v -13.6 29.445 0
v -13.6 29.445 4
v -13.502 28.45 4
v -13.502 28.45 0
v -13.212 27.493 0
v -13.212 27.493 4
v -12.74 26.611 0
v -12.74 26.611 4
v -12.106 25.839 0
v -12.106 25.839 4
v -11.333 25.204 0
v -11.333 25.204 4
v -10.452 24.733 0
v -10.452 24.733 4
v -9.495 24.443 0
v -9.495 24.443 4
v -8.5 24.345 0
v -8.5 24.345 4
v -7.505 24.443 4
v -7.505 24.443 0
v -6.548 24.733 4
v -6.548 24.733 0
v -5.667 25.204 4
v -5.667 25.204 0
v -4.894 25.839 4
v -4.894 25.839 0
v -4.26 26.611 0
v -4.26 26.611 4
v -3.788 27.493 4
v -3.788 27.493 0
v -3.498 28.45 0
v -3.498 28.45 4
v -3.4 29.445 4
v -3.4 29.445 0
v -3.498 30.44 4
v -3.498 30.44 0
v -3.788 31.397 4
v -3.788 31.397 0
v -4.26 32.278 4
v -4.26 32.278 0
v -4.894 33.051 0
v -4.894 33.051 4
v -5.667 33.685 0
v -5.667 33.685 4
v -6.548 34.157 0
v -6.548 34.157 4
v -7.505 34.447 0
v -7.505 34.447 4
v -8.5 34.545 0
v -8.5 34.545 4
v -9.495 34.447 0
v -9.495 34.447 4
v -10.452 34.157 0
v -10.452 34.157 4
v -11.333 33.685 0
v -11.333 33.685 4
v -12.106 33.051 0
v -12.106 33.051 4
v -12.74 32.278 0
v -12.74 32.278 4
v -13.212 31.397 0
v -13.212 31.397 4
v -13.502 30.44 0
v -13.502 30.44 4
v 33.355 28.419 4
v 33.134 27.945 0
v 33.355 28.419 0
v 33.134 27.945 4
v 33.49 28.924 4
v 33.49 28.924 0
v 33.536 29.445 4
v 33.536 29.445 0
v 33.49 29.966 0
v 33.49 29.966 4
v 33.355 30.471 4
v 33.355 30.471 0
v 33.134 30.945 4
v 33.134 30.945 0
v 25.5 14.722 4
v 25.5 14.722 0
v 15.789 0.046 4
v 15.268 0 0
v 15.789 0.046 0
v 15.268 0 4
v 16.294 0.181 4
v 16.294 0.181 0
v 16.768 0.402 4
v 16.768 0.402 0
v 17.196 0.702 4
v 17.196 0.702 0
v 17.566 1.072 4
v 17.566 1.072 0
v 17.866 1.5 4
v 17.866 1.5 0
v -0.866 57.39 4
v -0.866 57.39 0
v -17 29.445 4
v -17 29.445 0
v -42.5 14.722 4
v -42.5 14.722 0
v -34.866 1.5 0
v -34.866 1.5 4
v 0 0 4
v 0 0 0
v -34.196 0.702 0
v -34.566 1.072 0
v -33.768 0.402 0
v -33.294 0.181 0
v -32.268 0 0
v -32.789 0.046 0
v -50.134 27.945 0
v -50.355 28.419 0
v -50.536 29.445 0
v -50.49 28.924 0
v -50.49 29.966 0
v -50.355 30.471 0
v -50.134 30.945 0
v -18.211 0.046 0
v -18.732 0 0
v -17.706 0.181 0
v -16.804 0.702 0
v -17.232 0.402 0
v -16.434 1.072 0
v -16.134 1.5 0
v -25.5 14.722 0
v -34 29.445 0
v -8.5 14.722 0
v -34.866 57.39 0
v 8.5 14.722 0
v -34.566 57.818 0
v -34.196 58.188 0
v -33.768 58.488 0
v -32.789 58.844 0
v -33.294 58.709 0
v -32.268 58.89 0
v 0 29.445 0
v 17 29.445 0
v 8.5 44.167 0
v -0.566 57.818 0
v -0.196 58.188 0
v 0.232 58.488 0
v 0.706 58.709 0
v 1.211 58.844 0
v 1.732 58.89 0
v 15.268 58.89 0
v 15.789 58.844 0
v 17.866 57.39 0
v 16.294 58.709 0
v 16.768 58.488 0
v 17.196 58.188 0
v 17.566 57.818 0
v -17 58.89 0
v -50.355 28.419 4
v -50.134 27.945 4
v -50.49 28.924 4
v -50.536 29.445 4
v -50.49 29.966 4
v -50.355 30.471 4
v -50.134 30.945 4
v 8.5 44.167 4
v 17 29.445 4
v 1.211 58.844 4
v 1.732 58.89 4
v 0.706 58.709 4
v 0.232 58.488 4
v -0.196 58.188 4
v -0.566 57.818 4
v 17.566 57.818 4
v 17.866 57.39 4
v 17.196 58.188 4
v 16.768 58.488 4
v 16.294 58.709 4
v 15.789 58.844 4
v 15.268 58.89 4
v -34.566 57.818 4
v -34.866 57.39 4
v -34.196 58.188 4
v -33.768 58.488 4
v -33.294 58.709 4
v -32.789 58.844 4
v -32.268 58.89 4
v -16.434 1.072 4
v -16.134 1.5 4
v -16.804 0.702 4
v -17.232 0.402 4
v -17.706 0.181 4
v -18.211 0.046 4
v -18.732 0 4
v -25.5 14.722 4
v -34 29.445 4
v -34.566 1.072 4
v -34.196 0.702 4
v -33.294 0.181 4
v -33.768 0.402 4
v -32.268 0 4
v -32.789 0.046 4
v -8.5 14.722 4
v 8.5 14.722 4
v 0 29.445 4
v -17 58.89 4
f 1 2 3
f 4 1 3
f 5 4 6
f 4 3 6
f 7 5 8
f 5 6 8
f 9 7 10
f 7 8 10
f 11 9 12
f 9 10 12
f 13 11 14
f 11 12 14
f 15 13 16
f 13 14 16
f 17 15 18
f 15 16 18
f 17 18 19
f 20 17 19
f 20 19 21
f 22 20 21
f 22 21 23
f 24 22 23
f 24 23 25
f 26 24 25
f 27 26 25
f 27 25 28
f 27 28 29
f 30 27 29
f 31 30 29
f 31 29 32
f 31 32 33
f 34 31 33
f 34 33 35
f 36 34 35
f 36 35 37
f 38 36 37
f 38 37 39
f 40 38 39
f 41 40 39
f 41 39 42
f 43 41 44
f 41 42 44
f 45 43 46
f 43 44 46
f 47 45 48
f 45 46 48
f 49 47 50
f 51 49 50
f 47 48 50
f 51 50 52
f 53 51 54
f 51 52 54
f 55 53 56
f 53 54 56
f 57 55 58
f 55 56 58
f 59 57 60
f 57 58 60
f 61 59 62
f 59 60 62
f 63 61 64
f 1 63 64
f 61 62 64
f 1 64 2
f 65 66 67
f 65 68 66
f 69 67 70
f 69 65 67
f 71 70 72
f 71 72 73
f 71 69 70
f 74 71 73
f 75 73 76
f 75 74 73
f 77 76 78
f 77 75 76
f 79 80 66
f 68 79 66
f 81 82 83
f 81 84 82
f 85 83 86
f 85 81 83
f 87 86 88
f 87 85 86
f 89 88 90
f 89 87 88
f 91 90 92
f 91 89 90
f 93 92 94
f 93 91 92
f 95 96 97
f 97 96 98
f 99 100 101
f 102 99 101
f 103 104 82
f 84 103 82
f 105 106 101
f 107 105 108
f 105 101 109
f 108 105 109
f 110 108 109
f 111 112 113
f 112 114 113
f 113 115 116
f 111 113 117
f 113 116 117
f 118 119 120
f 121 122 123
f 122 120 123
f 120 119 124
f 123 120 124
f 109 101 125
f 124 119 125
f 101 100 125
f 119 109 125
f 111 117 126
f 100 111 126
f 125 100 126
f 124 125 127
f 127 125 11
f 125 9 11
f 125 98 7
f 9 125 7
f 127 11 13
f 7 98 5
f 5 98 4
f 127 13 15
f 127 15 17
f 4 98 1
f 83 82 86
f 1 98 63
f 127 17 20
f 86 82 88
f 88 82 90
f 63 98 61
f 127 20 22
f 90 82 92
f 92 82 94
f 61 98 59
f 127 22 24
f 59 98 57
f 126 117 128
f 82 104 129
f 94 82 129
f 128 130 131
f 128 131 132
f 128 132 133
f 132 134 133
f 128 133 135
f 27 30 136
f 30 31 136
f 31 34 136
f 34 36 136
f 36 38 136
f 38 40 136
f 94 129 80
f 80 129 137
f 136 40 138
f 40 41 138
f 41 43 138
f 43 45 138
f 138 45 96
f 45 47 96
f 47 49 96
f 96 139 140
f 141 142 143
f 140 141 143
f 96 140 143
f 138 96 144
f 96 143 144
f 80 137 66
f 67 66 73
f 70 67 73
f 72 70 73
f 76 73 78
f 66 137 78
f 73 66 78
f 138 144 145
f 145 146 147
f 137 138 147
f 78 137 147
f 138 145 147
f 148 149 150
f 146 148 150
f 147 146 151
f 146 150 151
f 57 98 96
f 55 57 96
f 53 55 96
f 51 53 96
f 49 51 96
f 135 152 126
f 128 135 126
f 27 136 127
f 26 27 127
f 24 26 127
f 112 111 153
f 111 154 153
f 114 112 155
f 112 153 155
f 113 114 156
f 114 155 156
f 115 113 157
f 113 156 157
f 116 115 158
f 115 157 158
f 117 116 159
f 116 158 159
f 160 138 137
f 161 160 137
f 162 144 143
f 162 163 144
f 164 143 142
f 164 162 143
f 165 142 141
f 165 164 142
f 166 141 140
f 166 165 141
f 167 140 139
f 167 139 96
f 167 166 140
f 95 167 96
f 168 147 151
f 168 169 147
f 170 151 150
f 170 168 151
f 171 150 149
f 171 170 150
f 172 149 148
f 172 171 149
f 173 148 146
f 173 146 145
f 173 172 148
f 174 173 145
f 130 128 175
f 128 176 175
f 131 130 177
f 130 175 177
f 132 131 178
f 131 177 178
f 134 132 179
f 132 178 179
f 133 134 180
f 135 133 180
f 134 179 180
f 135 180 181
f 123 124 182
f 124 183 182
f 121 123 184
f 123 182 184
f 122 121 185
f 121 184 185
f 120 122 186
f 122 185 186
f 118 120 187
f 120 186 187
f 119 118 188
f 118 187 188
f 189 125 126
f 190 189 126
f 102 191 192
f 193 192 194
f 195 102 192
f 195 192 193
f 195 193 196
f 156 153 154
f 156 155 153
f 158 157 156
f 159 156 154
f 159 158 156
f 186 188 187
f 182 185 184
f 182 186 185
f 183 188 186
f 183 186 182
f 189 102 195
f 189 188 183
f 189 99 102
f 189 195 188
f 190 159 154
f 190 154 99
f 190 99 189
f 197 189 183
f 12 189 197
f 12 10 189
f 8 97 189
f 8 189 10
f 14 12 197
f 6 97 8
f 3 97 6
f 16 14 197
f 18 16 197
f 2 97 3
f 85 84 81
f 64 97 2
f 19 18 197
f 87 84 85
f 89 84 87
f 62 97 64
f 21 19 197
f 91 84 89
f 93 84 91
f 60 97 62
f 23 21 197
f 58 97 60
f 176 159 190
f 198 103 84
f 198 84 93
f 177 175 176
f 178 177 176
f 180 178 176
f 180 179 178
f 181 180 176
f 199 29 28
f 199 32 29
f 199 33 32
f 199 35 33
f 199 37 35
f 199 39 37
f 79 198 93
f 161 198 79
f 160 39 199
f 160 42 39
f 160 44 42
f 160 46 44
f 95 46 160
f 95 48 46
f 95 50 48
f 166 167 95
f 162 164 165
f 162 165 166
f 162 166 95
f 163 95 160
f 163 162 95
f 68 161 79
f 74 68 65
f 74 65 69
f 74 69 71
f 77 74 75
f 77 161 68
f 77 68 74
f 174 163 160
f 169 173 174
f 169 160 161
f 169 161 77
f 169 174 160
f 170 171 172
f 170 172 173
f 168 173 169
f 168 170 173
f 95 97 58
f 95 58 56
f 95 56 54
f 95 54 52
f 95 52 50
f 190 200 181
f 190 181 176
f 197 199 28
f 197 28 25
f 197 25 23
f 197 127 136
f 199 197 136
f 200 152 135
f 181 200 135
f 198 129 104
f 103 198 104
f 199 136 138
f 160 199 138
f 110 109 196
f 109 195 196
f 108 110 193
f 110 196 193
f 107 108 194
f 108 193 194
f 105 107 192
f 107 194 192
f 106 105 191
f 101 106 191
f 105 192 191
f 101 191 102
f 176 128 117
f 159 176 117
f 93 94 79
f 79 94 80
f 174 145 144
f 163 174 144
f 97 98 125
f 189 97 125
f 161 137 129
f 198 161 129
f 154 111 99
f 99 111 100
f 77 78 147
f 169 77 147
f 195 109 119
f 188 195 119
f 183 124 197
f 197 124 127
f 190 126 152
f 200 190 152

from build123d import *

# Parameters (mm, degrees)
F2_DEPTH = 4
F3_D     = 10.2
F4_R     = 3


with BuildPart() as f2:
    # F0 (on Top) → F2 (new body)
    with BuildSketch(Plane.XY):
        Polygon((8.5, 14.7224318643), (0, 0), (17, 0), (25.5, 14.7224318643), (34, 29.4448637287), (25.5, 44.167295593), (17, 58.8897274573), (0, 58.8897274573), (-8.5, 44.167295593), (-17, 29.4448637287), (-25.5, 14.7224318643), (-34, 29.4448637287), (-25.5, 44.167295593), (-17, 58.8897274573), (-34, 58.8897274573), (-42.5, 44.167295593), (-51, 29.4448637287), (-42.5, 14.7224318643), (-34, 0), (-17, 0), (-8.5, 14.7224318643), (0, 29.4448637287), (8.5, 44.167295593), (17, 29.4448637287), align=None)
    extrude(amount=F2_DEPTH)

    # F3 (through all)
    with Locations(Plane(origin=(0, 0, 0), x_dir=(1, 0, 0), z_dir=(0, 0, -1))):
        with Locations((-8.5, -29.4448637287)):
            Hole(F3_D / 2)

    # F4
    f4_edges = [f2.edges().sort_by_distance(p)[0] for p in [
        (-51, 29.444864, 2),
        (-34, 58.889727, 2),
        (0, 58.889727, 2),
        (17, 58.889727, 2),
        (34, 29.444864, 2),
        (17, 0, 2),
        (-17, 0, 2),
        (-34, 0, 2),
    ]]
    fillet(f4_edges, radius=F4_R)


solid = f2.part
